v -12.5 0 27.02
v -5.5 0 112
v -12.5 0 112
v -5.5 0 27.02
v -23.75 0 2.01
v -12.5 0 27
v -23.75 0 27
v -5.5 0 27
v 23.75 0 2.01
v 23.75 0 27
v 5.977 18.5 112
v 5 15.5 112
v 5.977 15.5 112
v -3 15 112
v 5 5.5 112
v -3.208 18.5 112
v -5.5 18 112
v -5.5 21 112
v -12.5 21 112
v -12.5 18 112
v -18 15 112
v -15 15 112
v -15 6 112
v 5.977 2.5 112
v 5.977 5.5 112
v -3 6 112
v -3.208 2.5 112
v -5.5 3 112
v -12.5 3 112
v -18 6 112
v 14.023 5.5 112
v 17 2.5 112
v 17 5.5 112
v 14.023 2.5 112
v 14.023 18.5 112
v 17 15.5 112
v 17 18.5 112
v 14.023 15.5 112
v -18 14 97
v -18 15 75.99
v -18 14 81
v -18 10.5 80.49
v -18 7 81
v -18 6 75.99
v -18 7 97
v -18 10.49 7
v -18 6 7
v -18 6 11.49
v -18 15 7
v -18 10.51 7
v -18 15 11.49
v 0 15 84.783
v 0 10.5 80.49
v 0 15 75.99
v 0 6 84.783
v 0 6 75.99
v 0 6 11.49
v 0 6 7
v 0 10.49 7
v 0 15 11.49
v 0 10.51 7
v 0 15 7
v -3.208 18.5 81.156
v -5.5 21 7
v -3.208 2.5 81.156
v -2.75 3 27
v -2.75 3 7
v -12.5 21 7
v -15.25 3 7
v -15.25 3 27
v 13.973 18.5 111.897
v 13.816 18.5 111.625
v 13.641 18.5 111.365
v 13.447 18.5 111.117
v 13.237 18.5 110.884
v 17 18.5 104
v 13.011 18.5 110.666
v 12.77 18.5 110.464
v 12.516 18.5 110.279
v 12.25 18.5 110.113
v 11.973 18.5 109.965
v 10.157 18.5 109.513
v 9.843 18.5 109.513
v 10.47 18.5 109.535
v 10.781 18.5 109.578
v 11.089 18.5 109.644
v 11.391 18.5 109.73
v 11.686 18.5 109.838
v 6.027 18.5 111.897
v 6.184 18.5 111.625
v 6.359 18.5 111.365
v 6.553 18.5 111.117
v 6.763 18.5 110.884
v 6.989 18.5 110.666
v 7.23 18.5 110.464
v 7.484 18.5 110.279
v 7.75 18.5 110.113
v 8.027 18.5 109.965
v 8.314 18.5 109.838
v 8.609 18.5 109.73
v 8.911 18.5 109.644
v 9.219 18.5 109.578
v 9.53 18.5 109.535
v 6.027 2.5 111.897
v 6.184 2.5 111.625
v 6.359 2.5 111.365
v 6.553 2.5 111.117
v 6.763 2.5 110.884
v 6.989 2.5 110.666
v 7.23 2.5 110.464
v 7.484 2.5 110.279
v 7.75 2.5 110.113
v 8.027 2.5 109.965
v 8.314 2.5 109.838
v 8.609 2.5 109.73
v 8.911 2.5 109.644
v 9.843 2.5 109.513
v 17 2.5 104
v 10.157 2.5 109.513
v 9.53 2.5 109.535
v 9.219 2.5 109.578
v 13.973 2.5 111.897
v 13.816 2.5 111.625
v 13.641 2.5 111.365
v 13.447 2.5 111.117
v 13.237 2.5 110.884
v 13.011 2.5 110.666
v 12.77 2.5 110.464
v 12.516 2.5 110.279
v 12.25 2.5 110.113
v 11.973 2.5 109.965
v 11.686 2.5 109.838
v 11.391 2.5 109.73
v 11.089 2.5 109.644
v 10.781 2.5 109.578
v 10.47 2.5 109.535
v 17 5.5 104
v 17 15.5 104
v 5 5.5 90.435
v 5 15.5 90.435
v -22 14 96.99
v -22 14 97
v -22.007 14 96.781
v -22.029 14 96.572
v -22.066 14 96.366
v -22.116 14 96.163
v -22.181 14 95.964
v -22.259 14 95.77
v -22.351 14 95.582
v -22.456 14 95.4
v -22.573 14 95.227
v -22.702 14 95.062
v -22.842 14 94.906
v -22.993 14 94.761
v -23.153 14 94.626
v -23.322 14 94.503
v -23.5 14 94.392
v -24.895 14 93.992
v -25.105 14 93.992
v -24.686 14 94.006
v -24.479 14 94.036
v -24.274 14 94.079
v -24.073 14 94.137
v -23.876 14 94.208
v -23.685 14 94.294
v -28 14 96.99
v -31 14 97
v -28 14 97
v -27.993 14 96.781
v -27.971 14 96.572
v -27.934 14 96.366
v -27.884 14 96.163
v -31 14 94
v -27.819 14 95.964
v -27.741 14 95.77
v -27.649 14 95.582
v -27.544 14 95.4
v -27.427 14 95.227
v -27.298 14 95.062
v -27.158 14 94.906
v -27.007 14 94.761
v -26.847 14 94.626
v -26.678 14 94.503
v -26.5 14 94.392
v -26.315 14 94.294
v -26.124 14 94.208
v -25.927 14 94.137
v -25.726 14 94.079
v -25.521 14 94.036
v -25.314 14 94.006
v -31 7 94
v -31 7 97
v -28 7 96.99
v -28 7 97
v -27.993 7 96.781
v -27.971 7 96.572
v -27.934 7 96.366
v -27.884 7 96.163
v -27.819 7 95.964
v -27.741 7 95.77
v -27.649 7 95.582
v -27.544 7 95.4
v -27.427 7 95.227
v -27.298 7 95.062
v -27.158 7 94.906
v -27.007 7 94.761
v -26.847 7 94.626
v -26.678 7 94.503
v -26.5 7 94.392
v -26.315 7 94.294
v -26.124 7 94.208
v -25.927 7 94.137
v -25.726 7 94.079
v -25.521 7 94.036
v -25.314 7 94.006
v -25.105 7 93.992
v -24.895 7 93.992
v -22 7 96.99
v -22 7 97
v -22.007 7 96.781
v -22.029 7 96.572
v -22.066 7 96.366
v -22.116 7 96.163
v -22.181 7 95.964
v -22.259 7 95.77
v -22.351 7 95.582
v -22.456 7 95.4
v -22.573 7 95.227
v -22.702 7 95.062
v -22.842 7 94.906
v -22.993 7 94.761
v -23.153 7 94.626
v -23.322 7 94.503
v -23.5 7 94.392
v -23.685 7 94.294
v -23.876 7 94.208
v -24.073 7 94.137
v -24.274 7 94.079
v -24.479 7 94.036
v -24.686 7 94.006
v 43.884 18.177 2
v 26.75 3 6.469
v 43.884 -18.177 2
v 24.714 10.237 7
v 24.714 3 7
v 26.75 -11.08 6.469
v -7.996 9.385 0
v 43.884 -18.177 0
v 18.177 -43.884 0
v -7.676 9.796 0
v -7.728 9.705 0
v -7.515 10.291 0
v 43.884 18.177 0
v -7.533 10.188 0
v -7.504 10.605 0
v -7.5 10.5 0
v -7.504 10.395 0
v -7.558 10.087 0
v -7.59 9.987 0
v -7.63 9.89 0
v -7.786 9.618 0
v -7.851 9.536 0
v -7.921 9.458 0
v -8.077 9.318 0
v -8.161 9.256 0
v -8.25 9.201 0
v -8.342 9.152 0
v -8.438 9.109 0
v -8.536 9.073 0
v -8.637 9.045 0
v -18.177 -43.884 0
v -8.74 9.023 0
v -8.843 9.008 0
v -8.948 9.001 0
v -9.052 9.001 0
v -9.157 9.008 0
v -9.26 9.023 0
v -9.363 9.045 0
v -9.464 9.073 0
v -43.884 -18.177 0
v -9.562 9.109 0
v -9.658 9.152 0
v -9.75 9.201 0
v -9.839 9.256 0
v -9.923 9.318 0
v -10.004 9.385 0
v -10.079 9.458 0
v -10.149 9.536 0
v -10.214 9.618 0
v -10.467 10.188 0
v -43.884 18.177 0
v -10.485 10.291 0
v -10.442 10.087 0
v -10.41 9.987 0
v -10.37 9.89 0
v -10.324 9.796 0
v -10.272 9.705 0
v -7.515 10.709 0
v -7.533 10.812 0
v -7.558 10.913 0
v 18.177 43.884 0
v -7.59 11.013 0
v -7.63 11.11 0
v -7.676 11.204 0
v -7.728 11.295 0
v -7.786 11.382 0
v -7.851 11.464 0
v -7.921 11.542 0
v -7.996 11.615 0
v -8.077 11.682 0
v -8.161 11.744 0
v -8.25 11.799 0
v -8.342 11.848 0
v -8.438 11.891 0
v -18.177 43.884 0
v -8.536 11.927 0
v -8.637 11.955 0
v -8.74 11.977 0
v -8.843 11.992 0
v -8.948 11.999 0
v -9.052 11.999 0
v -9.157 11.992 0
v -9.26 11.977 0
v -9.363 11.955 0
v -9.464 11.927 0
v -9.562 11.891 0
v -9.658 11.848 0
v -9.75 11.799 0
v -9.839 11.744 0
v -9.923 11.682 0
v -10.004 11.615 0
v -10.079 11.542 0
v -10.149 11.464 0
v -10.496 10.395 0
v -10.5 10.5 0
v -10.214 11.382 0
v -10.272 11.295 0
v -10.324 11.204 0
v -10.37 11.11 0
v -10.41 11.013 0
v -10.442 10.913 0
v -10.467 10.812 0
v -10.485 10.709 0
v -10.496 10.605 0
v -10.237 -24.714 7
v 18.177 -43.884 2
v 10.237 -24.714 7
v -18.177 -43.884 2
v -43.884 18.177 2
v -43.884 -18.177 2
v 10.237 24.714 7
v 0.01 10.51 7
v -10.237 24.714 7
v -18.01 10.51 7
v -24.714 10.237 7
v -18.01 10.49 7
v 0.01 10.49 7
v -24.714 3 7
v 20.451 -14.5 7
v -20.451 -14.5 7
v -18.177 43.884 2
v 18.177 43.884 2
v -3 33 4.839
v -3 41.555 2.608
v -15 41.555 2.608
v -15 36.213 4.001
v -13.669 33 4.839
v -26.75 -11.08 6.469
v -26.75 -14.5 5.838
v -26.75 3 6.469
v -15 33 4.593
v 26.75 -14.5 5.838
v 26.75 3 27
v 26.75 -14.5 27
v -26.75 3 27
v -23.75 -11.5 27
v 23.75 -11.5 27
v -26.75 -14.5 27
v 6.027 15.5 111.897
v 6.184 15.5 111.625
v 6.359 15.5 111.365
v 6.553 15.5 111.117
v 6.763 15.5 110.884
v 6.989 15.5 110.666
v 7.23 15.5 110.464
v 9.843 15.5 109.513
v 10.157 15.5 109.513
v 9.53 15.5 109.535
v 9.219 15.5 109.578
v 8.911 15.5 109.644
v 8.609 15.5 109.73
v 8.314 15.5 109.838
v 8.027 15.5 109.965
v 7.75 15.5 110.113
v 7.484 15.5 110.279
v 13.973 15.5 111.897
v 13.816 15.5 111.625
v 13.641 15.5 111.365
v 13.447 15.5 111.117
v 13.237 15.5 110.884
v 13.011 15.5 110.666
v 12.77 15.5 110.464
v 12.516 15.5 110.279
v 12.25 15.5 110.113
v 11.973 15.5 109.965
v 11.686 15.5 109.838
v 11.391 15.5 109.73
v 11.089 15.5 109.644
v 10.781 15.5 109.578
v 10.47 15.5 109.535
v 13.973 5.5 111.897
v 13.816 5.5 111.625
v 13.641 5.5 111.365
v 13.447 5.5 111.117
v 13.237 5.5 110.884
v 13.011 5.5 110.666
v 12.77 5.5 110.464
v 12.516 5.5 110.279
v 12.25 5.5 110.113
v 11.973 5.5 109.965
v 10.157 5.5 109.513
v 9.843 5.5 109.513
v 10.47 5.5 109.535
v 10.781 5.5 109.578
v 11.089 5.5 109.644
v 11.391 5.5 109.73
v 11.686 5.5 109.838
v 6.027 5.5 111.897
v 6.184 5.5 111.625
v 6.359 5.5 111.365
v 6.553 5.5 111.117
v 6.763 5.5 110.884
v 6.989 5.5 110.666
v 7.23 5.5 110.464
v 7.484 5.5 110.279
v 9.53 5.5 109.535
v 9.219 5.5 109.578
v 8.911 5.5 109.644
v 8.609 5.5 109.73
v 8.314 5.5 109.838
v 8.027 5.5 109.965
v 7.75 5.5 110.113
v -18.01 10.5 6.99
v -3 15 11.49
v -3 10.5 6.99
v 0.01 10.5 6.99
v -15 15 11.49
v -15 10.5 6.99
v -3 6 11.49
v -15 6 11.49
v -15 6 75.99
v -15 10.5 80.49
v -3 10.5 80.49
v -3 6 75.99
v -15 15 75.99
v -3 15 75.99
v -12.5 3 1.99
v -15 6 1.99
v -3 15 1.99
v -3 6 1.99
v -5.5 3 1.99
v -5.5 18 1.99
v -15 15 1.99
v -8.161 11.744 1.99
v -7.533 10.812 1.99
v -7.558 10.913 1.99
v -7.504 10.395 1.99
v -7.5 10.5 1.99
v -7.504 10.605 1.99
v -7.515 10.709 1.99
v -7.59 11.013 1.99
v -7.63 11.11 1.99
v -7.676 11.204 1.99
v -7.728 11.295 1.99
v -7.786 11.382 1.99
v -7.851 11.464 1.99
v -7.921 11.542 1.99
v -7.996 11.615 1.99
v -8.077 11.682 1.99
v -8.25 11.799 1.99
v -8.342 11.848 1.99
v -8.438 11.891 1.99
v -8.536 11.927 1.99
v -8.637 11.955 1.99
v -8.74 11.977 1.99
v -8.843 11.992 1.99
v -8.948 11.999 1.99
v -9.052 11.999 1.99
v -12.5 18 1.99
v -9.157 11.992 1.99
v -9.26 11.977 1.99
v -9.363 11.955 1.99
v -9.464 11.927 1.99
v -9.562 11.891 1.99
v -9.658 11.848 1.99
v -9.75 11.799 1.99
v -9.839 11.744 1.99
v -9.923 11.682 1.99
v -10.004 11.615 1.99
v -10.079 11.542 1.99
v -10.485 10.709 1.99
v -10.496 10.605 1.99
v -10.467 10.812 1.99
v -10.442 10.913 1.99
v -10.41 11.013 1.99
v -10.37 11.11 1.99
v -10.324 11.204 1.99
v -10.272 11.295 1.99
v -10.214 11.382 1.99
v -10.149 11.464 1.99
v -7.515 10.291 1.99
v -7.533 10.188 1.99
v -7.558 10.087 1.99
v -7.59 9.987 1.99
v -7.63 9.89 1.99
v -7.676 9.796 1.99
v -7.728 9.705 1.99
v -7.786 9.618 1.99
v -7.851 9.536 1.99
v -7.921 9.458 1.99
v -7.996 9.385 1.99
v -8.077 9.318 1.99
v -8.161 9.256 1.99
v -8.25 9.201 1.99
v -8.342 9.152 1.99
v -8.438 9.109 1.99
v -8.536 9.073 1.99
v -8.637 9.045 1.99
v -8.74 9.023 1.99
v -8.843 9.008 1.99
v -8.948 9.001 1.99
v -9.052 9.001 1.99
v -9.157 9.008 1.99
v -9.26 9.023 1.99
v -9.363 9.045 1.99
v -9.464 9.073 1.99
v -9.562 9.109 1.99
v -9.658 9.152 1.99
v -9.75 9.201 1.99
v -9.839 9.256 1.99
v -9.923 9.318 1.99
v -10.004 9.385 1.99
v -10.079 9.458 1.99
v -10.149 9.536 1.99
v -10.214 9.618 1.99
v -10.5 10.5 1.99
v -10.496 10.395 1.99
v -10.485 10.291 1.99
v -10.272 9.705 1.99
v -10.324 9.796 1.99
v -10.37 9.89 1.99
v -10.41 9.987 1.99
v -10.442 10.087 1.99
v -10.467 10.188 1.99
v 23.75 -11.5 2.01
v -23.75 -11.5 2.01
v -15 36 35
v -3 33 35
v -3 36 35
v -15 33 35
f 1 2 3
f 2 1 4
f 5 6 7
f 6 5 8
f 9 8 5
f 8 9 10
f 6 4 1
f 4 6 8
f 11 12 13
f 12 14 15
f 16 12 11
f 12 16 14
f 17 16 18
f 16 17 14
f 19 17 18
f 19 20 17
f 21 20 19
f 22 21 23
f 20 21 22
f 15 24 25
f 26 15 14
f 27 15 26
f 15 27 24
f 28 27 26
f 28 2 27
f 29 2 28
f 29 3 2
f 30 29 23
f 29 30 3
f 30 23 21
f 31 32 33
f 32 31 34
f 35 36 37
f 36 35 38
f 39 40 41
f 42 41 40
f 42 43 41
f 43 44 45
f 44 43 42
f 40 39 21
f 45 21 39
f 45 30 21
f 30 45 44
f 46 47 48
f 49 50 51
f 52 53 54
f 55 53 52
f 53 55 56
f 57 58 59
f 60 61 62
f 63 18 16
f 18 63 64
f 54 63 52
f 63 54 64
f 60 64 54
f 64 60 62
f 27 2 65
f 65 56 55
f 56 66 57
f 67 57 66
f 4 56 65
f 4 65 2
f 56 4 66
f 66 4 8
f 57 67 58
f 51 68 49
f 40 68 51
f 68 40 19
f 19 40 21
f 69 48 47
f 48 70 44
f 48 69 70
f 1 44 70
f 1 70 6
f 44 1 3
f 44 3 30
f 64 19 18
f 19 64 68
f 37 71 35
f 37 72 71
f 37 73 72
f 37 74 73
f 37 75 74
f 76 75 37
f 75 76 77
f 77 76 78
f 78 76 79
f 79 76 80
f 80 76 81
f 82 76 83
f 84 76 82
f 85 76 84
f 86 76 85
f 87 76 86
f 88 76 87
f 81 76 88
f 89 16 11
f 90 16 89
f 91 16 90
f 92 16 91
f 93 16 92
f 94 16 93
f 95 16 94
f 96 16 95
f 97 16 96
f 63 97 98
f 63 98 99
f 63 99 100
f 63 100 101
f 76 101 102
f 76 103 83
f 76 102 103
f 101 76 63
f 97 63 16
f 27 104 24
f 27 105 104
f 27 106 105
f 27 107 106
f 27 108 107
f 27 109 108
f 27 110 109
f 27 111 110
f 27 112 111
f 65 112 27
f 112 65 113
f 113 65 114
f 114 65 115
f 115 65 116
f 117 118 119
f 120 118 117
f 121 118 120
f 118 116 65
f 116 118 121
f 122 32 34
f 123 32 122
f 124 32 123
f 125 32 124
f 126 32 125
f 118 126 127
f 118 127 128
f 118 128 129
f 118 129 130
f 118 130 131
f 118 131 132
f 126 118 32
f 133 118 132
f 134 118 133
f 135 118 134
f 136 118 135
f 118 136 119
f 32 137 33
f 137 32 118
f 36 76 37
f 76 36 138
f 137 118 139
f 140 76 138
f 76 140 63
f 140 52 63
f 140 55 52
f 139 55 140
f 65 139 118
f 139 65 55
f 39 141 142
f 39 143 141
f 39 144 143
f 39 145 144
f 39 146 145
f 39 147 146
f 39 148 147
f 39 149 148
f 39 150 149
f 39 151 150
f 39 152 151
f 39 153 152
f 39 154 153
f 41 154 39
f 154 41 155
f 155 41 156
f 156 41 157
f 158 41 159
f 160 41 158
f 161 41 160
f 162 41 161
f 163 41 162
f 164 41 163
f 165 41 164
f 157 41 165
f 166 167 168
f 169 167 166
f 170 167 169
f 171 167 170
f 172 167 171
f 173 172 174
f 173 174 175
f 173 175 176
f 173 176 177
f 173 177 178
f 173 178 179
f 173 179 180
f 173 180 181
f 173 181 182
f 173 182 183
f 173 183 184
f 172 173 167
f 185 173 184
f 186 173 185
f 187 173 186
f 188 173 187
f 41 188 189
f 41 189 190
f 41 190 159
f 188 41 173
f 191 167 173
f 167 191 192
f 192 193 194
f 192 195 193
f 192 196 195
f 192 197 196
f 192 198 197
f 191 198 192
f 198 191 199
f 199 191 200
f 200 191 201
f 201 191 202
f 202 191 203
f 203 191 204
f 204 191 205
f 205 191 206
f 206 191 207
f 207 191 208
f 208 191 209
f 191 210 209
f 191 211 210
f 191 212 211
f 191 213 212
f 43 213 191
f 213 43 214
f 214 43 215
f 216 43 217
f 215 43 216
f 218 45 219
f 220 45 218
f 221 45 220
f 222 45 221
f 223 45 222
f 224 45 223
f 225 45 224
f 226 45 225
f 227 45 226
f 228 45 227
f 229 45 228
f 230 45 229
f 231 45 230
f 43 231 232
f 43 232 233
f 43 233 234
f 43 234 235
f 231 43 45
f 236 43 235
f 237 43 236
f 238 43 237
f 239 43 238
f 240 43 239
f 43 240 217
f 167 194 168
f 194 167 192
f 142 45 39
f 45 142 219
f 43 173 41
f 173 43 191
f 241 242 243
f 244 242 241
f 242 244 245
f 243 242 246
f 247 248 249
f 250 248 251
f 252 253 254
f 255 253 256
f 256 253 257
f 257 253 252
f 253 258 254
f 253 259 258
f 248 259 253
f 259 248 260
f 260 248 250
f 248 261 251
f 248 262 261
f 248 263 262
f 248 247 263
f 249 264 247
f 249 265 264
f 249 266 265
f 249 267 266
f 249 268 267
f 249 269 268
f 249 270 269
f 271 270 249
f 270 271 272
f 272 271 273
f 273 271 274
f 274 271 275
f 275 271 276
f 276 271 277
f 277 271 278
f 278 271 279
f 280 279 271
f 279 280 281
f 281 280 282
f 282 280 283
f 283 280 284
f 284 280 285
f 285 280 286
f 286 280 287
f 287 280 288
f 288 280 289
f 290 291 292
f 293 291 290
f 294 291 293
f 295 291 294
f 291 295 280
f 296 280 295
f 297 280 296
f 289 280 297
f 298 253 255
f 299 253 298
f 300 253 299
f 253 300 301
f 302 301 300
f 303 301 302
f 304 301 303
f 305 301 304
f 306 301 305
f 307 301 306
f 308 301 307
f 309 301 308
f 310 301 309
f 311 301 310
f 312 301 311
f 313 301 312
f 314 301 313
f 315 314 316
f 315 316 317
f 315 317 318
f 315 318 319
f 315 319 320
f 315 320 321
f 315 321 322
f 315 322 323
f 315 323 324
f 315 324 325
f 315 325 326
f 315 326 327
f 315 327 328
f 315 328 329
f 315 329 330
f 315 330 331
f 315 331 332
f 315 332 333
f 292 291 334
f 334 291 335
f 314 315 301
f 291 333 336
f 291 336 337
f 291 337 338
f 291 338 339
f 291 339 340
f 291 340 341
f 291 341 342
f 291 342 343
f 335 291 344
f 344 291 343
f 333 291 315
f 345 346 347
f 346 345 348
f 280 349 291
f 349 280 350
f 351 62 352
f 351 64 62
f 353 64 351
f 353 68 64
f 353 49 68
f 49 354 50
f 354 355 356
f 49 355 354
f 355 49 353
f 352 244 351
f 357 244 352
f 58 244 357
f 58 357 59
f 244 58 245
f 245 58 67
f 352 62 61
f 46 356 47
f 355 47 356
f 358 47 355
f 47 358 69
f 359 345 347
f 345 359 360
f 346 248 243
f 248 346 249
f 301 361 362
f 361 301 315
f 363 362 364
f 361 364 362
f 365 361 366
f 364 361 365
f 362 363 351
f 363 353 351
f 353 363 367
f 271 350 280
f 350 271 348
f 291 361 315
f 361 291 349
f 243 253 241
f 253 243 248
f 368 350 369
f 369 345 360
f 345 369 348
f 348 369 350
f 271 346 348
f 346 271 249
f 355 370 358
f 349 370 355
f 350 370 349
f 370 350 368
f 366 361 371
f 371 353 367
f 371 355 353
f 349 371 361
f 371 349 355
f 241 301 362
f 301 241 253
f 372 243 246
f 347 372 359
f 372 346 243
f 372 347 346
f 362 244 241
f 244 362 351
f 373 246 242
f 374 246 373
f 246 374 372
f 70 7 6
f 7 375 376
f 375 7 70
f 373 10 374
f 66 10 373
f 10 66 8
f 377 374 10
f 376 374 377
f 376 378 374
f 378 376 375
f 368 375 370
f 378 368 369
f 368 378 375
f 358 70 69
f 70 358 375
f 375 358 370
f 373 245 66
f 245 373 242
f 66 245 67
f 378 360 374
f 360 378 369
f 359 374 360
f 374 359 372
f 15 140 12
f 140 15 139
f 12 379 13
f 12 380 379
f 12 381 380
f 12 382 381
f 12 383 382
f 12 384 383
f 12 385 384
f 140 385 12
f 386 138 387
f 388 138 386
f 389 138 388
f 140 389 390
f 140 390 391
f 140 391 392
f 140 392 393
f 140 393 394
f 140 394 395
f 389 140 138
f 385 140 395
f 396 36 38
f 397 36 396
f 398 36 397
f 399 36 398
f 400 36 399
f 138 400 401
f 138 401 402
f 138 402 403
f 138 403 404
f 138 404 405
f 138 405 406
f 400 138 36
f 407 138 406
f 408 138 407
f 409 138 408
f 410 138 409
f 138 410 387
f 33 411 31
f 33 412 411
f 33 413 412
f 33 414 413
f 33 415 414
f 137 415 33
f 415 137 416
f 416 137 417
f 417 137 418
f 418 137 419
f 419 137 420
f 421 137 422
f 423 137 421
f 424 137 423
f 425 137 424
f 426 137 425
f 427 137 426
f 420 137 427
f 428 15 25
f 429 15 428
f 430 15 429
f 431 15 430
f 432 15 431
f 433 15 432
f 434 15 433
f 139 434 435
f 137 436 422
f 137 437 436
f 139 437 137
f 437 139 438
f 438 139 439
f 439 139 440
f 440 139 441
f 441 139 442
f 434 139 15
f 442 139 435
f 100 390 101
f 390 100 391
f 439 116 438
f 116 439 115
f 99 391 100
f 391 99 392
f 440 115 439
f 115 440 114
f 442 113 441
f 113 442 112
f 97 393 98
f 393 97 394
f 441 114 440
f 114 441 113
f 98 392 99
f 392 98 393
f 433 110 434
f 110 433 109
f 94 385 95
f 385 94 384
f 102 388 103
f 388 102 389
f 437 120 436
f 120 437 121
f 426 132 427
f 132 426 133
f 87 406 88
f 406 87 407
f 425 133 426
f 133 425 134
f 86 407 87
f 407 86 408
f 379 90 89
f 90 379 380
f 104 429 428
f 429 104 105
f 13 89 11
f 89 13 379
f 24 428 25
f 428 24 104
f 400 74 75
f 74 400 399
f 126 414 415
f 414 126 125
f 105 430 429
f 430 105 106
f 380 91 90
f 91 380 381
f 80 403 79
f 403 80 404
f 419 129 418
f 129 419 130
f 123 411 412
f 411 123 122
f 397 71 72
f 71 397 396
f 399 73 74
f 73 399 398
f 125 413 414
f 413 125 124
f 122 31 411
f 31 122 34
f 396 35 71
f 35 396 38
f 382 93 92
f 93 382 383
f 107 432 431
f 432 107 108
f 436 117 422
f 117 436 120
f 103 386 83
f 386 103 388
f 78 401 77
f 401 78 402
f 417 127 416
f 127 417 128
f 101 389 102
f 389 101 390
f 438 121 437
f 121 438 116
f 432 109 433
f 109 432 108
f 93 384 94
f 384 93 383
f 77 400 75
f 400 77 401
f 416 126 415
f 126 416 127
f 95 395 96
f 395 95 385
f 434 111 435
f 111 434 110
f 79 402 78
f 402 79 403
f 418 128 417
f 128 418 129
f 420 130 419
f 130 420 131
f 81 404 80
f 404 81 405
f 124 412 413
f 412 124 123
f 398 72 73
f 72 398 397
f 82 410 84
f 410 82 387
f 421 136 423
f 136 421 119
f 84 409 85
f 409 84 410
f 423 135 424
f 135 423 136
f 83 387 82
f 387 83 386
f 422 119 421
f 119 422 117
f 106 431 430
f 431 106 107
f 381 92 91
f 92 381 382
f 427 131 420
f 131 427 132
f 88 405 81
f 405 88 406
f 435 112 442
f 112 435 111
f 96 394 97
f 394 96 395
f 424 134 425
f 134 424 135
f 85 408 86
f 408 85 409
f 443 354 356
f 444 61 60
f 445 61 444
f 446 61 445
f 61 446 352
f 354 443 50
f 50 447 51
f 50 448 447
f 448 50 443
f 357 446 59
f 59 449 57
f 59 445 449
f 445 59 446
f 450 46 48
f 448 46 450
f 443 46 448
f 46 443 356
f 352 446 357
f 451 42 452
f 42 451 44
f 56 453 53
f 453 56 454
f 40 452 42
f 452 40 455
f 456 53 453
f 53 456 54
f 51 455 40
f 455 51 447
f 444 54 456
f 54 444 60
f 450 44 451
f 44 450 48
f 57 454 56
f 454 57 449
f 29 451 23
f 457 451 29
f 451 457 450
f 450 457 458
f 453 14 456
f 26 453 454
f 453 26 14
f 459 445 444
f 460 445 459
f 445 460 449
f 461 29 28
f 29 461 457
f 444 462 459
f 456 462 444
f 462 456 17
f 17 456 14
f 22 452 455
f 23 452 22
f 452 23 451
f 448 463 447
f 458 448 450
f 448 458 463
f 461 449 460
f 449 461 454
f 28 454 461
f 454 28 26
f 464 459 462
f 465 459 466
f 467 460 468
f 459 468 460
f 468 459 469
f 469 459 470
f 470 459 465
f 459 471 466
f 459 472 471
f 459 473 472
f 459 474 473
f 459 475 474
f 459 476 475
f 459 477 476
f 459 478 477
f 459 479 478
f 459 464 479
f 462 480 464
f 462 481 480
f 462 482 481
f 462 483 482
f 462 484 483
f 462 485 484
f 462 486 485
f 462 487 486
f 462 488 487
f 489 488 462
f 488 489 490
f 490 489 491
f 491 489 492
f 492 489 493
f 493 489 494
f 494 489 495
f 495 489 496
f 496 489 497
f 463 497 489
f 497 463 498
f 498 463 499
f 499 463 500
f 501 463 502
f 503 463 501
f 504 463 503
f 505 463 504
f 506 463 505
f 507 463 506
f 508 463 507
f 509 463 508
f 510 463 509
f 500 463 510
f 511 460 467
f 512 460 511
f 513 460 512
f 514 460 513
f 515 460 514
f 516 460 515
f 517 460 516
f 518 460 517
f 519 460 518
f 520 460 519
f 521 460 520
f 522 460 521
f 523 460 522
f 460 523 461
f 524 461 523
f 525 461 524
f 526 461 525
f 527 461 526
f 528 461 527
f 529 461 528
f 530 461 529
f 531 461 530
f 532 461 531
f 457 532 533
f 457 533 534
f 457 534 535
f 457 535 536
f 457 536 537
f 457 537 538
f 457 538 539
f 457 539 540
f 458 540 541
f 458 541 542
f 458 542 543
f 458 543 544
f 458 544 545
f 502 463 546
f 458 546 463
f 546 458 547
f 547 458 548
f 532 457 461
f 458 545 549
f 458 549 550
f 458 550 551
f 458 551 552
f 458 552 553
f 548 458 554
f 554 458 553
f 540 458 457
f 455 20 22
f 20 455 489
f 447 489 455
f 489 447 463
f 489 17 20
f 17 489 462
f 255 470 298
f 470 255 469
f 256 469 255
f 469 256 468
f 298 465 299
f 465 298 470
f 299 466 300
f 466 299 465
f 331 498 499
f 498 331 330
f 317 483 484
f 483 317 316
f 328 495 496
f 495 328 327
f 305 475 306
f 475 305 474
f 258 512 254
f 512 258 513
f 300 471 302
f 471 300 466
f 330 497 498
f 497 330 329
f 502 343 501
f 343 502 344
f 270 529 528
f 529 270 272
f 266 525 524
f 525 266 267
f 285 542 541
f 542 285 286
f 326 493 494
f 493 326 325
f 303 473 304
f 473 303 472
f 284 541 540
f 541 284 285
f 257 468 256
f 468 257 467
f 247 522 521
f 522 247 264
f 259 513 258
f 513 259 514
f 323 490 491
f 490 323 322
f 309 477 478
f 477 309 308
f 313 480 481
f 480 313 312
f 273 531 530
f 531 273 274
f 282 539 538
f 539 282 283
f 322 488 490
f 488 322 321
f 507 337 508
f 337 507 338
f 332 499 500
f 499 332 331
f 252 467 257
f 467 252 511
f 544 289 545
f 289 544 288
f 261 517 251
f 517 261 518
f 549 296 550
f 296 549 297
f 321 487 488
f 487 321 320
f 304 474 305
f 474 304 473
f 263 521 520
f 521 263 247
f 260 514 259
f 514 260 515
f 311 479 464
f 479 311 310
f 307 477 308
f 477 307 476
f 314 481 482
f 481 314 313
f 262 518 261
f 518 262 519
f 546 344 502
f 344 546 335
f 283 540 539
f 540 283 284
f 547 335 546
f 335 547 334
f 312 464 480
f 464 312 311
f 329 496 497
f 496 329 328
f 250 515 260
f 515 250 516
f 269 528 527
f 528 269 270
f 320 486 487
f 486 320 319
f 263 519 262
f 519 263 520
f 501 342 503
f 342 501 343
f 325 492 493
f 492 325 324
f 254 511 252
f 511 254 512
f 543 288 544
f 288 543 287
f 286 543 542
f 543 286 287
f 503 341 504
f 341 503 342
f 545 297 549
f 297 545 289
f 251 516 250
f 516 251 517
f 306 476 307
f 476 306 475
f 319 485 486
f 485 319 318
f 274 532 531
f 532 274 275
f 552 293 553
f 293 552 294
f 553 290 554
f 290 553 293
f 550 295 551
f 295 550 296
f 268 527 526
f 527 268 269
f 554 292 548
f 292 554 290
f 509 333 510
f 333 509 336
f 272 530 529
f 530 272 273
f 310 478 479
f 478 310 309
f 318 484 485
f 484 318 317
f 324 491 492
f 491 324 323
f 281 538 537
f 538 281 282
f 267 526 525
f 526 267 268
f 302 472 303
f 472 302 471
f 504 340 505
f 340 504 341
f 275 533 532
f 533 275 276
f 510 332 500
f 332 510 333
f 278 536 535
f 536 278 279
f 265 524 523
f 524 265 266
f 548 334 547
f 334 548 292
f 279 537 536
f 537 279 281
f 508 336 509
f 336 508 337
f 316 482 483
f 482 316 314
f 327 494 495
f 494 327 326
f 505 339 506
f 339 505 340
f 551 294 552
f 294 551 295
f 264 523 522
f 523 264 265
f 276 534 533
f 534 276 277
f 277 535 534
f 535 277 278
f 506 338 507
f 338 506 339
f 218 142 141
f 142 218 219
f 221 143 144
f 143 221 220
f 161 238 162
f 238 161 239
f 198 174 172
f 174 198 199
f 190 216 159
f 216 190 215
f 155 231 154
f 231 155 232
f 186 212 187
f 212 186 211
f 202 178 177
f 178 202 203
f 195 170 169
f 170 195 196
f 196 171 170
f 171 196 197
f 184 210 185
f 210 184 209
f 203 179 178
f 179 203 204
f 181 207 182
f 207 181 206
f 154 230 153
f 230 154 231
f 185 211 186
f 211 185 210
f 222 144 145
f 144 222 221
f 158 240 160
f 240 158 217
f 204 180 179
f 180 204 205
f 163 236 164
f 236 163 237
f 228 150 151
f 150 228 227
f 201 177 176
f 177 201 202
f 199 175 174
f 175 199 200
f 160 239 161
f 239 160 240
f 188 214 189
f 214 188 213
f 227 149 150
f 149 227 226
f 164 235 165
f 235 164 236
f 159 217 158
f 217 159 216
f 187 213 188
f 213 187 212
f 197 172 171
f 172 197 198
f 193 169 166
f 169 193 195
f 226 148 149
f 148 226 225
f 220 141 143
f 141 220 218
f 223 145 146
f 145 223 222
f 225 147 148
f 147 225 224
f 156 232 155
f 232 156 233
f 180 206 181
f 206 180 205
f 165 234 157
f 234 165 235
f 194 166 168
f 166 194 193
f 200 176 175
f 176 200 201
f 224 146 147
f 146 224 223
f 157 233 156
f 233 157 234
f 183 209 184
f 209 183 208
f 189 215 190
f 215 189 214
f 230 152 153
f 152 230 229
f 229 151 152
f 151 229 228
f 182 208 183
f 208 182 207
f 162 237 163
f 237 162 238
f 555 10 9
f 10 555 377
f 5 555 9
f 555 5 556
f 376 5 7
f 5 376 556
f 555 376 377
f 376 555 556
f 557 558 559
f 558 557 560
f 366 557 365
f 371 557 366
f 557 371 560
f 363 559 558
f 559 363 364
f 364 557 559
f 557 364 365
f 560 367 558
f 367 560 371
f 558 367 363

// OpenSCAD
eps = 0.01;
$fn = 90;

// parameters
// base diameters
b_d = 95;
// base thickness
b_t = 2;
// base rising
b_r = 5;

// general parameters
// wall thickness
wt = 3;

// accessories dimensions
// rasor blade storage dimensions
rb_x = 47.5;
rb_y = 11.5;
rb_z = 72;
rb_h = 25;

// razor dimension
r_x = 9;
//r_y = 9;
//r_y = 11;
r_y = 10;
r_o = 5;
r_z = 110;
r_d = 5;
r_do = 3;
r_t = 5+r_do;

// toothbrush dimensions
tb_X = 12;
tb_x = 7;
tb_Y = 15;
tb_y = 9;
tb_z = 110;

// contact lens case paremeters
clc_t = 12;
clc_h = 35;

// interdental brush paramters
ib_t = 6;
ib_w = 7;
ib_o = 4;

// possible extention into separete module
module base()
{
    hull()
    {
        cylinder(d=b_d, h=b_t, $fn=8);
        translate([0,0,b_t])
            cylinder(d=rb_x+2*wt, h=b_r, $fn=8);
    }
    
}

module stand()
{
    difference()
    {
        union()
        {
            // base
            rotate([0,0,22.5]) base();
            
            // toothbrush block
            translate([tb_X/2+wt-tb_X-2*wt,tb_Y/2+wt,b_t])
            {
                hull()
                {
                    // vertical
                    translate([-tb_x/2, -tb_Y/2-wt, 0])
                        cube([tb_x, tb_Y+2*wt, tb_z]);
                    // horizontal
                    translate([-tb_X/2-wt, -tb_y/2, 0])
                        cube([tb_X+2*wt, tb_y, tb_z]);
                }
                
                // razor hook
                hull()
                {
                    // razor hook
                    translate([tb_X/2+2*wt,-r_y/2-wt,r_z-r_t])
                        cube([r_o+r_x,r_y+2*wt,r_t]);
                    
                    // razor hook support
                    translate([0,
                                -r_y/2-wt,
                                r_z-r_o-r_x-r_t-tb_X/2-2*wt])
                        cube([  wt,
                                r_y+2*wt,
                                r_o+r_x+r_t+tb_X/2+2*wt]);
                }
                
                // interdental hook
                translate([-tb_X/2-wt,-ib_w/2,tb_z-(2*wt+ib_t+ib_o)-15])
                hull()
                {
                    cube([wt,ib_w,2*wt+ib_t+ib_o]);
                    translate([-ib_t-ib_o-wt,0,wt+ib_t+ib_o])
                        cube([2*wt+ib_t+ib_o,ib_w,wt]);
                }
                
                
            }
            
            // razor blades stock stand
            translate([-rb_x/2-wt,-rb_y-wt,b_t])
                cube([rb_x+2*wt,rb_y+2*wt,rb_h]);
        }
        
        // toothbrush hole
        translate([tb_X/2+wt-tb_X-2*wt,tb_Y/2+wt,b_t-eps])
        {
            hull()
            {
                // vertical
                translate([-tb_x/2, -tb_Y/2, 0])
                    cube([tb_x, tb_Y, tb_z+2*eps]);
                // horizontal
                translate([-tb_X/2, -tb_y/2, 0])
                    cube([tb_X, tb_y, tb_z+2*eps]);
            }
        
            // blade hole
            translate([tb_X/2+wt+r_o,-r_y/2,b_r+2*eps])
            {
                cube([r_x+wt+eps,r_y,r_z+eps]);
                
                // deeping
                translate([r_o,-wt-eps,r_z-b_r-r_do+r_d])
                    rotate([-90,0,0])
                        cylinder(h=r_y+2*wt+2*eps,d=r_x);
            
            }
            
            // water hole
            _wh_d = (tb_X-wt)/sqrt(2); 
            translate([-tb_X/2-wt-eps,0,b_r])
            {
                _a = _wh_d;
                // lower side cut
                rotate([45,0,0])
                    cube([tb_X+2*wt+2*eps,_a,_a]);
                _l = tb_z-(r_o+r_x+r_t+tb_X/2+2*wt)-b_r-(tb_X-wt)/2-2;
                // upper side cut
                translate([0,0,_l])
                    rotate([45,0,0])
                        cube([tb_X+2*wt+2*eps,_a,_a]);
                // middle section
                translate([0,-(tb_X-wt)/2,(tb_X-wt)/2])
                    cube([tb_X+2*wt+2*eps,tb_X-wt,_l]);
                
                //rotate([0,90,0])
                //    rotate([0,0,0])
                //        cylinder(h=tb_X+2*wt+2*eps,d=_wh_d);
            }
            // vertical hole
            translate([0,0,-b_t-wt])
                cylinder(d=wt,h=b_r+2*eps);
            
            // interdental brush hooks
            translate([-tb_X/2-wt-ib_o-ib_t/2,ib_w/2+eps,tb_z-15])
                rotate([90,0,0])
                    cylinder(d=ib_t,h=ib_w+2*eps);
        }
        
        // razor blade storage hole
        translate([-rb_x/2,-rb_y,b_t+eps])
            cube([rb_x,rb_y,rb_h+eps]);
    }
    
    // contact lens case stand
    translate([0-tb_X-wt,tb_Y+2*wt+clc_t,0])
    hull()
    {
        cube([tb_X,3*wt,eps]);
        cube([tb_X,wt,clc_h]);
    }
    
}

stand();
